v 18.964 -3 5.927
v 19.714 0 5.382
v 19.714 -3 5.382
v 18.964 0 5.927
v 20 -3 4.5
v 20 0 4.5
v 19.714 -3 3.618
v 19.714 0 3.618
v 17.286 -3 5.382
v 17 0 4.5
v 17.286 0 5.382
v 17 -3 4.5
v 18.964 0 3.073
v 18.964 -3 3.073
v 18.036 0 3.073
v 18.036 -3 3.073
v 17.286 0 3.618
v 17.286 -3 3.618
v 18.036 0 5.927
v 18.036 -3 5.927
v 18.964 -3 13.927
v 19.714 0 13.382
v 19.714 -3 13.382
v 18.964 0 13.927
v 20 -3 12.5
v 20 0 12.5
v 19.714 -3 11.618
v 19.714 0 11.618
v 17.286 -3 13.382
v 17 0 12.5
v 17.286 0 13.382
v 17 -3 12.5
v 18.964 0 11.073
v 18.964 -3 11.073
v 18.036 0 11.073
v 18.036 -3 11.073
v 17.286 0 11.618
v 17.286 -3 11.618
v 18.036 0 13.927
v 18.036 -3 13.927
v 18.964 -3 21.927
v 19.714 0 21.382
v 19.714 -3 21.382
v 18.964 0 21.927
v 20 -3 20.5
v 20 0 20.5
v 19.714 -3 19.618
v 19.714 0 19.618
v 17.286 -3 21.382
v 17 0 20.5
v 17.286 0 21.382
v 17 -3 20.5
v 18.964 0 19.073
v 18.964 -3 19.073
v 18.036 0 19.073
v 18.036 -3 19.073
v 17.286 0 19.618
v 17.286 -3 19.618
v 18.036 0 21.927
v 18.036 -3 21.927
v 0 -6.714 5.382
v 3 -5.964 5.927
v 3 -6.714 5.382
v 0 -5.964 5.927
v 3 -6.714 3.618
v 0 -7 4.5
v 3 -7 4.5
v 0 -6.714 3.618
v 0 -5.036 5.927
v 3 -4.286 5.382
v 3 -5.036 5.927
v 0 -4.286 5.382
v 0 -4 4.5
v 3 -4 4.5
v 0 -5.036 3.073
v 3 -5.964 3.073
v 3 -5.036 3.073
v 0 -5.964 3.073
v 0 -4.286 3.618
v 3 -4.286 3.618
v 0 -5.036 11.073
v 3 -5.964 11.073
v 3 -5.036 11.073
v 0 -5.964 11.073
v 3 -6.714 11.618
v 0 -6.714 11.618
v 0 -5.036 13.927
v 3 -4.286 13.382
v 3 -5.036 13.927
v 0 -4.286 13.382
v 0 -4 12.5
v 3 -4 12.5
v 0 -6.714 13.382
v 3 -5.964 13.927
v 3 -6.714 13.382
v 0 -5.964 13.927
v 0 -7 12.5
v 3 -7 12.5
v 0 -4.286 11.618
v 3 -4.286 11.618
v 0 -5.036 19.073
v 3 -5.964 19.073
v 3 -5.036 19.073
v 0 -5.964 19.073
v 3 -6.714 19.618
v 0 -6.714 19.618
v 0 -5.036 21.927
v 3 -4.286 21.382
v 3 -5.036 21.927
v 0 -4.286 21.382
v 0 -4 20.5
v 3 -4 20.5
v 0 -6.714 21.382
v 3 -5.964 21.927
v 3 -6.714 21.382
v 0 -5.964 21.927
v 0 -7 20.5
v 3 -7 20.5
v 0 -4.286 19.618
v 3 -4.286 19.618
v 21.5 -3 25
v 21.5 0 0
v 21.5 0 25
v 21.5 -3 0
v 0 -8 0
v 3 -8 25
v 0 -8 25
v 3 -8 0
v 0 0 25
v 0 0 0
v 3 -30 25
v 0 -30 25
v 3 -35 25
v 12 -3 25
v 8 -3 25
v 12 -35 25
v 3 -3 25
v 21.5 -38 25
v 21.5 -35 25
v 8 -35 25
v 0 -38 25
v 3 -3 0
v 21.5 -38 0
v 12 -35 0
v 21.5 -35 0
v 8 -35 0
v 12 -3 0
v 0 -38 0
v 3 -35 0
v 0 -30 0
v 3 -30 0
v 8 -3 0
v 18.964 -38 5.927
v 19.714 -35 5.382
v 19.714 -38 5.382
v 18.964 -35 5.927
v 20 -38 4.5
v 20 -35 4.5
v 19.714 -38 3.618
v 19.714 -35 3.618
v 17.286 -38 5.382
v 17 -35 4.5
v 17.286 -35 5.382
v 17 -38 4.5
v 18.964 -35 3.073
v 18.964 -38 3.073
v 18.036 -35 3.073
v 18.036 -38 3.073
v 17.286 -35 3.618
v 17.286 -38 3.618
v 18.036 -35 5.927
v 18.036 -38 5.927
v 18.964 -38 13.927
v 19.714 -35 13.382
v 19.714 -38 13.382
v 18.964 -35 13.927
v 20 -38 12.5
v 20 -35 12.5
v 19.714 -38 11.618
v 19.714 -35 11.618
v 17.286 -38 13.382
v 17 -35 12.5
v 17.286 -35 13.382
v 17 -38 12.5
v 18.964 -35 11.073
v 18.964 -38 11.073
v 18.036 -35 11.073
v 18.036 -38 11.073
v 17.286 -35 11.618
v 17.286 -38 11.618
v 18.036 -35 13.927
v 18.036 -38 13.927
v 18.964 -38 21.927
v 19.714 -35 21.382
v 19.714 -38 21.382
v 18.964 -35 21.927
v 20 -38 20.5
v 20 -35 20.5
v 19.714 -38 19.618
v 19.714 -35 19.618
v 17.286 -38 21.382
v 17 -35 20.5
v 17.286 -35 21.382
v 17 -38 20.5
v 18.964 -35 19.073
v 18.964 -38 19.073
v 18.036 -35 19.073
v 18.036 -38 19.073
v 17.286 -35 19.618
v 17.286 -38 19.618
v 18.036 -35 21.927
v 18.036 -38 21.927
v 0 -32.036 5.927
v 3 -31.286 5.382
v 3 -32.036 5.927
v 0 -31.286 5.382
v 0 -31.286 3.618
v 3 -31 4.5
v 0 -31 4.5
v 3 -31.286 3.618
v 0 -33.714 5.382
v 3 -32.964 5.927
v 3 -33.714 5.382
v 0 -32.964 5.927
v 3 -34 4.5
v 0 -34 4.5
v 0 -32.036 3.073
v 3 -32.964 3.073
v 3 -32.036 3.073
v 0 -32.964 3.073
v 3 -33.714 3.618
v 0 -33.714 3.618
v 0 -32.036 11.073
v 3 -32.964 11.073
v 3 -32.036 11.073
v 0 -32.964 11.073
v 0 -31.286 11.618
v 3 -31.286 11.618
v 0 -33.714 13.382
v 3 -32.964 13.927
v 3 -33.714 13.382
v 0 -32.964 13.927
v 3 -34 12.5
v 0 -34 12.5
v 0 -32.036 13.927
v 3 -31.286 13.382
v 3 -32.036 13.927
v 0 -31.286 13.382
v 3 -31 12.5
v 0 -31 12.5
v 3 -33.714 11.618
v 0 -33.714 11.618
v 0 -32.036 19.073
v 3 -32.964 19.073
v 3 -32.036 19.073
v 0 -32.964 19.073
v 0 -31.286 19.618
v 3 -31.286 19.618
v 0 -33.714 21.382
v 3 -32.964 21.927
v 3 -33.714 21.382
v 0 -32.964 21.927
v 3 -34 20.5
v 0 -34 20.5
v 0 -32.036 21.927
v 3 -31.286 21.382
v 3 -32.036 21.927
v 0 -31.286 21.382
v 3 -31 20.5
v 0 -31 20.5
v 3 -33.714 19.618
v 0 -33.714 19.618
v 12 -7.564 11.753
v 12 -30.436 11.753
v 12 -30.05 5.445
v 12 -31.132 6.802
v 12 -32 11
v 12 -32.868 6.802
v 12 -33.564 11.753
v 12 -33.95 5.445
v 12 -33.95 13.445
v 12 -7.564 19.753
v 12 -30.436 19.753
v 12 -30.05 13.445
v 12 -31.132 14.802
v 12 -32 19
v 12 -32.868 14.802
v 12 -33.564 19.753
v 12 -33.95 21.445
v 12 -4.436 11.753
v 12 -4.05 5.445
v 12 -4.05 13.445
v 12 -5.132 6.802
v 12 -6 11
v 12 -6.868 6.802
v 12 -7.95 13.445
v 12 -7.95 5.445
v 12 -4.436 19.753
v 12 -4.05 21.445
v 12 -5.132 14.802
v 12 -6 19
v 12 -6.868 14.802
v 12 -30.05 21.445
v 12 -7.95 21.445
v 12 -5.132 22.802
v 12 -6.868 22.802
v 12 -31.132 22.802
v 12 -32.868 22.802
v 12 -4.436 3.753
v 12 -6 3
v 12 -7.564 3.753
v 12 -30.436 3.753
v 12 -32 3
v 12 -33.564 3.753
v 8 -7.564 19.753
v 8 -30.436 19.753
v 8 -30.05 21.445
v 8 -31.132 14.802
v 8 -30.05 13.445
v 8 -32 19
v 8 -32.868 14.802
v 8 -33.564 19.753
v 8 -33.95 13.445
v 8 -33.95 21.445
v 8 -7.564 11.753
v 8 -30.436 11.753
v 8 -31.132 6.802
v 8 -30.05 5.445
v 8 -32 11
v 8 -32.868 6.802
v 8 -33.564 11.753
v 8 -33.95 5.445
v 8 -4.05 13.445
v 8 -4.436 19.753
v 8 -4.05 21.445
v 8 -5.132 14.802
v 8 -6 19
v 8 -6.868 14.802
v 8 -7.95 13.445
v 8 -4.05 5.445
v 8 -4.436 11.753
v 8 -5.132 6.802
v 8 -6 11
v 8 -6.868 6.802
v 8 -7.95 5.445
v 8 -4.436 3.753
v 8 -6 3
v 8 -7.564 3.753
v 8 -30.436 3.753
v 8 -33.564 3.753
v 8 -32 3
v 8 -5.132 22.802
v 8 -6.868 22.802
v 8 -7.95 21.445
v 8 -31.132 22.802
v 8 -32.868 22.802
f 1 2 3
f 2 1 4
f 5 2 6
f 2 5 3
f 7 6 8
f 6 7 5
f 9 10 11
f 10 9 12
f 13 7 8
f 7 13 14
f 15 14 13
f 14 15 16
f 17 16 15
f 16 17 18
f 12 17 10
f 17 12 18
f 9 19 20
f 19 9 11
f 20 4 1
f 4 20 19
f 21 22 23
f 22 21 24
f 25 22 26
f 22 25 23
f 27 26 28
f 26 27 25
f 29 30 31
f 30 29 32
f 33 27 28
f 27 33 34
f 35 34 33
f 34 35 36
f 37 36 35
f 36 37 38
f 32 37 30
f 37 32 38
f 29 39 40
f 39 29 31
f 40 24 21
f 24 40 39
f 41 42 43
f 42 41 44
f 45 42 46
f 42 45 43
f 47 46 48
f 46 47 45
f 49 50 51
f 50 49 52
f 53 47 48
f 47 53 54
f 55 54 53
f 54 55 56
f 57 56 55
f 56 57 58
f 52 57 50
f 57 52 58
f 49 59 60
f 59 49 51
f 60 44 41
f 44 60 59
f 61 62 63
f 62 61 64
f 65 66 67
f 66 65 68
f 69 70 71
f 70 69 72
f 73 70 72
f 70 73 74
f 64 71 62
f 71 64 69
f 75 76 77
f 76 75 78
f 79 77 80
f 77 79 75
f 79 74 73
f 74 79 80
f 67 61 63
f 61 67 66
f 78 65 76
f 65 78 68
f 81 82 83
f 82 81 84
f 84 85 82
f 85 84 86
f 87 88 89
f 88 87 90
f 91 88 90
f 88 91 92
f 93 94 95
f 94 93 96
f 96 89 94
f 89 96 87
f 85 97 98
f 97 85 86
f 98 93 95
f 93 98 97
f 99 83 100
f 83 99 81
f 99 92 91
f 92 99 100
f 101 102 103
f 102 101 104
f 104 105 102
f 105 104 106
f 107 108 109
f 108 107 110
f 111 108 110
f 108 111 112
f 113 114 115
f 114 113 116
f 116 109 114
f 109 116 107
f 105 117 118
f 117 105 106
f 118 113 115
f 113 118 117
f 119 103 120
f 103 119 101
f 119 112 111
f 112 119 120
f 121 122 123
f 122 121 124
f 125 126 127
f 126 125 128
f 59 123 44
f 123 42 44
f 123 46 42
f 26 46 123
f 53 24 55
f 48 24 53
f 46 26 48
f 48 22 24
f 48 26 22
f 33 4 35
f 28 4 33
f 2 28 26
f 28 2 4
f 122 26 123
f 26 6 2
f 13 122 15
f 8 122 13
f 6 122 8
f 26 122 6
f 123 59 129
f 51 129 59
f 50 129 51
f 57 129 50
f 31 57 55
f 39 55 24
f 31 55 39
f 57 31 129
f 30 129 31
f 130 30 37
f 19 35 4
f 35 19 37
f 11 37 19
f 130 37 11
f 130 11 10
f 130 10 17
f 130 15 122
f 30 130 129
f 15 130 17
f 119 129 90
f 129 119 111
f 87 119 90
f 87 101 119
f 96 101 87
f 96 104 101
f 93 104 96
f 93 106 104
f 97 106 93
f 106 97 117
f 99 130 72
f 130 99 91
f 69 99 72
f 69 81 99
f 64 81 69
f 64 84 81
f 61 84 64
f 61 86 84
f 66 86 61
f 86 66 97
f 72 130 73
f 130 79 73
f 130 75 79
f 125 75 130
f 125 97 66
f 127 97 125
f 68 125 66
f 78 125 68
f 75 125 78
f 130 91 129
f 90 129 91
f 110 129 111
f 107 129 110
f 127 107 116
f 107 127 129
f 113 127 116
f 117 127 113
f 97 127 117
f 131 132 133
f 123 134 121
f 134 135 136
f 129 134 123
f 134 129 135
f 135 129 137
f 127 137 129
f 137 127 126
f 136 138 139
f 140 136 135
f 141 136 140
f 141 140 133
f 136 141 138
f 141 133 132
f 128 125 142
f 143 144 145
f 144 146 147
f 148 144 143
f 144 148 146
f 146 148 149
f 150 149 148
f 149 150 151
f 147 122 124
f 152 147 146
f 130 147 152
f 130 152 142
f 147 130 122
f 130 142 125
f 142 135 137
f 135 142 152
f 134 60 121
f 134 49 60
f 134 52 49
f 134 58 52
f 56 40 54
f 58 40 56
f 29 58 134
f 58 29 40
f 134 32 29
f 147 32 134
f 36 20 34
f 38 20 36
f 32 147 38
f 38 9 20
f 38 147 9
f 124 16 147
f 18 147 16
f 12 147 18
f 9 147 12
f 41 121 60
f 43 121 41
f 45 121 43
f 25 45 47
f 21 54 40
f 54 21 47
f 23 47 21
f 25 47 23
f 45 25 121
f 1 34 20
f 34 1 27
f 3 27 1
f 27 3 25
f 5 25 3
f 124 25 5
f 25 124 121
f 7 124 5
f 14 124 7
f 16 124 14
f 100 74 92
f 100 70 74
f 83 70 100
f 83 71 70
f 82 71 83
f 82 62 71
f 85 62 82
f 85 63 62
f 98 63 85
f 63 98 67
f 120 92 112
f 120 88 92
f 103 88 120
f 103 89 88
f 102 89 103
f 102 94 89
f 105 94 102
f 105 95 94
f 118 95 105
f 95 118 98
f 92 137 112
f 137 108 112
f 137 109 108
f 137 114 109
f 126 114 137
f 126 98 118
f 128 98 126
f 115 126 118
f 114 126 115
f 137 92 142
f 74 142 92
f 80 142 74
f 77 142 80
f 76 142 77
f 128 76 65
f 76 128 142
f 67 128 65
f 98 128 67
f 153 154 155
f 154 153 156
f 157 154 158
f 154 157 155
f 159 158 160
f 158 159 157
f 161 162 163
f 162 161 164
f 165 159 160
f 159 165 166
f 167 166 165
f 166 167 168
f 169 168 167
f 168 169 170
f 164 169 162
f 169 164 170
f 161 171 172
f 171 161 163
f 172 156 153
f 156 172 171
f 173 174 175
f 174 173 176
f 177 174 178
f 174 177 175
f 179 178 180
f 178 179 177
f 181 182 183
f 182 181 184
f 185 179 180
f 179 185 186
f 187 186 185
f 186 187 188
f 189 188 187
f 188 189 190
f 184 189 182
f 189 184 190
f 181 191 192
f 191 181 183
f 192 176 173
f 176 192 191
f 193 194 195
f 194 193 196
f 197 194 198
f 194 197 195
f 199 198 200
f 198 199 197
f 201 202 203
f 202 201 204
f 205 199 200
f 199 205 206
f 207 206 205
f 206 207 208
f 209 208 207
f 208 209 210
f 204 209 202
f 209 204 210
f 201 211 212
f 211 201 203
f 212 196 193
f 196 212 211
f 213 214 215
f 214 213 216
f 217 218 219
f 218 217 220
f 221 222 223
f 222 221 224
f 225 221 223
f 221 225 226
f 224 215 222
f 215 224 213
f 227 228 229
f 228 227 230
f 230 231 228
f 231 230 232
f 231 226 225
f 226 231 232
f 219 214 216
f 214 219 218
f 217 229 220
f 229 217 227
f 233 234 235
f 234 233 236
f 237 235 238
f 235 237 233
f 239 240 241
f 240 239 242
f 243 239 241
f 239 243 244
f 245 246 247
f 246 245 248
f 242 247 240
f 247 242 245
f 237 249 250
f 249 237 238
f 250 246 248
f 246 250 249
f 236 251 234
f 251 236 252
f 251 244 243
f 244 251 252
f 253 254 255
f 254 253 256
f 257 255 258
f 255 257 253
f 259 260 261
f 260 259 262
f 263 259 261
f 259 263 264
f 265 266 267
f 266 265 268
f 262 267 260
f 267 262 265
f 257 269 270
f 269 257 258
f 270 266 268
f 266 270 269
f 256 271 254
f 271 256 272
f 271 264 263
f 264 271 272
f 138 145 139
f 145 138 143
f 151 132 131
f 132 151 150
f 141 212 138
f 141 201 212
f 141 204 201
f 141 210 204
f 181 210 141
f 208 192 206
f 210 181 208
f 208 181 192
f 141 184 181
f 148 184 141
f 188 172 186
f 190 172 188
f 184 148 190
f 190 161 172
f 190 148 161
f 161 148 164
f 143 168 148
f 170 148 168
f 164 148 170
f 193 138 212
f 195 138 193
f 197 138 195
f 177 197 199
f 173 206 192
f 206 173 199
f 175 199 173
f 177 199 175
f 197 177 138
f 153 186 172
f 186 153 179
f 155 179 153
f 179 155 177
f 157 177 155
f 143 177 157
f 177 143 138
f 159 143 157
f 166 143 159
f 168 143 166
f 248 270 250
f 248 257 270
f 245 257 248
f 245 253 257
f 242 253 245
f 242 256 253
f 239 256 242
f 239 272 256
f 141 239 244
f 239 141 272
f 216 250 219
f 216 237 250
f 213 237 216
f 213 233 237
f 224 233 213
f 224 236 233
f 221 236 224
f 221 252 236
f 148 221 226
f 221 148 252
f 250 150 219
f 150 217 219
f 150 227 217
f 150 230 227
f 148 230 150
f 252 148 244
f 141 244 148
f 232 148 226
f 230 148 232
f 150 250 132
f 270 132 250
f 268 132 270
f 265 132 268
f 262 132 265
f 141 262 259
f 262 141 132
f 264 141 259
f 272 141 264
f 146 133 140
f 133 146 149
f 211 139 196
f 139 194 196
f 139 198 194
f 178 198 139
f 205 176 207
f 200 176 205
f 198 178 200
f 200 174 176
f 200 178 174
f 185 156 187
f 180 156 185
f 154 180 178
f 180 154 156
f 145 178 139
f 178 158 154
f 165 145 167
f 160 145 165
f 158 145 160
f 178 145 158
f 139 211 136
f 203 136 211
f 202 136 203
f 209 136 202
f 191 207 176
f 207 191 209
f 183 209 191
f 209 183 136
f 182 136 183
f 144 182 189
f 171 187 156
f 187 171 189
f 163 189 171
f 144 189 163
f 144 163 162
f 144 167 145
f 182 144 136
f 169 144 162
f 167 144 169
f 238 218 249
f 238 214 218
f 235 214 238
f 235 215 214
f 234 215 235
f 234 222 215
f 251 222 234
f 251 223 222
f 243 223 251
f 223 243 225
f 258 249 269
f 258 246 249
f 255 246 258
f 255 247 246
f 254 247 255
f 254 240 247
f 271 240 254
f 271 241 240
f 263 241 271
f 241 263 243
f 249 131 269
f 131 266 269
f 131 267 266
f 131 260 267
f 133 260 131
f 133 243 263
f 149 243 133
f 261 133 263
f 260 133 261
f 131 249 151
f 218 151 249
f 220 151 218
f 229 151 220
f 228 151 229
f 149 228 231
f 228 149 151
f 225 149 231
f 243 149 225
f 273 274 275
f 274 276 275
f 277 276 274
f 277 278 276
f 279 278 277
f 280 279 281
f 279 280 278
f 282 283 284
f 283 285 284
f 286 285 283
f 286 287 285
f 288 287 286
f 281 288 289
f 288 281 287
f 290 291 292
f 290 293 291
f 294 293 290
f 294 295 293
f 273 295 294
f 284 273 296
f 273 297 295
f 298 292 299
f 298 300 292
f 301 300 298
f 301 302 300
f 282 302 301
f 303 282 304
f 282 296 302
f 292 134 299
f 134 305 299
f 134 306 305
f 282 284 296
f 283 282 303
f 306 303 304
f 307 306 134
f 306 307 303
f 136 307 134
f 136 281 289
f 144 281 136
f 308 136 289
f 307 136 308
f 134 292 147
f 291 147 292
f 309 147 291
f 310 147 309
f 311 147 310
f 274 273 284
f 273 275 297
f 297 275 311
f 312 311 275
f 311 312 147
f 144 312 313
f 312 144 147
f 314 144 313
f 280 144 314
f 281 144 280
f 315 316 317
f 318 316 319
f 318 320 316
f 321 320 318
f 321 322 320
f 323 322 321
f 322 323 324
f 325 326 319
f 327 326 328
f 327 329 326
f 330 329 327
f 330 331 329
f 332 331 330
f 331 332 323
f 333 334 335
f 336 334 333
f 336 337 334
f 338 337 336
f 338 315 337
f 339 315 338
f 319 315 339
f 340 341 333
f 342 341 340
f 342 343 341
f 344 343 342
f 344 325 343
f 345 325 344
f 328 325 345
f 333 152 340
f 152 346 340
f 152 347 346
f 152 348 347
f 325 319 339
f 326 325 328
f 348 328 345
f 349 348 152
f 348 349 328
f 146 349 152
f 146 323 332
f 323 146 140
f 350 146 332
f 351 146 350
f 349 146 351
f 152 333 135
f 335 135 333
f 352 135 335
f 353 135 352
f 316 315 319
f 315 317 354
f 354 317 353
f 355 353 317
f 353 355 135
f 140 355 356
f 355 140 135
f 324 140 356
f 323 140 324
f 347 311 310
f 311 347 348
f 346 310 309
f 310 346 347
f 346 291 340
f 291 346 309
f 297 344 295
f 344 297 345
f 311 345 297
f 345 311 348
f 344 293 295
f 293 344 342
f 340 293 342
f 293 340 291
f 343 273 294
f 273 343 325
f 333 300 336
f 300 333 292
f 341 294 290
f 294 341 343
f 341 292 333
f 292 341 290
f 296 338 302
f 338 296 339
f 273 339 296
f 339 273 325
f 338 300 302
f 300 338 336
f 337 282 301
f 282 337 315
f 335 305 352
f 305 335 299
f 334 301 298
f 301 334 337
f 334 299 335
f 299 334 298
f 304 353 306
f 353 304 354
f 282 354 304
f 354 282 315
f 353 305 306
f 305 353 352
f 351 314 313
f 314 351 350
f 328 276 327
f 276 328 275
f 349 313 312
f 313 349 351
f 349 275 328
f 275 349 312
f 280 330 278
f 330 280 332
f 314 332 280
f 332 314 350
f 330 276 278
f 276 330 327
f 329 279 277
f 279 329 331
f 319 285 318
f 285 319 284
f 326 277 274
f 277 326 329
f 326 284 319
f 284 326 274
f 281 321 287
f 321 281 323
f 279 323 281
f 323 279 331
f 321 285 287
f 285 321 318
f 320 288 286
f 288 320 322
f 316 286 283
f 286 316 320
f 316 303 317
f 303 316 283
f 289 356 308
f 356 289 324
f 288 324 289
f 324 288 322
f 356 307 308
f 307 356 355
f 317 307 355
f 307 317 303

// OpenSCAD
module agujereado(x,y){
	union(){
		for(j=[0:y-1])
		{
			translate([0,j*8,0])
			{
				for(i=[0:x-1])
				{
					translate([8*i,0,-1])cylinder(r=1.5, h=30, $fn=10);
				}
			}
		}
	}
}


module lateral(){
	rotate([90,0,0]) difference(){
		cube([21.5,25,8]);
		translate([3,0,3]) cube([24,25,9]);
		translate([10.5,4.5,0]) agujereado(2,3);
		translate([0,4.5,5.5]) rotate([0,90,0]) agujereado(1,3);
	}
}

difference(){
	union(){
		lateral();
		translate([0,-(11+27),0]) mirror([0,1,0]) lateral();
		translate([8,-38,0]) cube([4,38,25]);
	}
	translate([5,-6,5]) rotate([0,90,0]) cylinder(r=2,h=20);
	translate([5,-6,13]) rotate([0,90,0]) cylinder(r=2,h=20);
	translate([5,-6,21]) rotate([0,90,0]) cylinder(r=2,h=20);
	translate([5,-32,5]) rotate([0,90,0]) cylinder(r=2,h=20);
	translate([5,-32,13]) rotate([0,90,0]) cylinder(r=2,h=20);
	translate([5,-32,21]) rotate([0,90,0]) cylinder(r=2,h=20);
}
